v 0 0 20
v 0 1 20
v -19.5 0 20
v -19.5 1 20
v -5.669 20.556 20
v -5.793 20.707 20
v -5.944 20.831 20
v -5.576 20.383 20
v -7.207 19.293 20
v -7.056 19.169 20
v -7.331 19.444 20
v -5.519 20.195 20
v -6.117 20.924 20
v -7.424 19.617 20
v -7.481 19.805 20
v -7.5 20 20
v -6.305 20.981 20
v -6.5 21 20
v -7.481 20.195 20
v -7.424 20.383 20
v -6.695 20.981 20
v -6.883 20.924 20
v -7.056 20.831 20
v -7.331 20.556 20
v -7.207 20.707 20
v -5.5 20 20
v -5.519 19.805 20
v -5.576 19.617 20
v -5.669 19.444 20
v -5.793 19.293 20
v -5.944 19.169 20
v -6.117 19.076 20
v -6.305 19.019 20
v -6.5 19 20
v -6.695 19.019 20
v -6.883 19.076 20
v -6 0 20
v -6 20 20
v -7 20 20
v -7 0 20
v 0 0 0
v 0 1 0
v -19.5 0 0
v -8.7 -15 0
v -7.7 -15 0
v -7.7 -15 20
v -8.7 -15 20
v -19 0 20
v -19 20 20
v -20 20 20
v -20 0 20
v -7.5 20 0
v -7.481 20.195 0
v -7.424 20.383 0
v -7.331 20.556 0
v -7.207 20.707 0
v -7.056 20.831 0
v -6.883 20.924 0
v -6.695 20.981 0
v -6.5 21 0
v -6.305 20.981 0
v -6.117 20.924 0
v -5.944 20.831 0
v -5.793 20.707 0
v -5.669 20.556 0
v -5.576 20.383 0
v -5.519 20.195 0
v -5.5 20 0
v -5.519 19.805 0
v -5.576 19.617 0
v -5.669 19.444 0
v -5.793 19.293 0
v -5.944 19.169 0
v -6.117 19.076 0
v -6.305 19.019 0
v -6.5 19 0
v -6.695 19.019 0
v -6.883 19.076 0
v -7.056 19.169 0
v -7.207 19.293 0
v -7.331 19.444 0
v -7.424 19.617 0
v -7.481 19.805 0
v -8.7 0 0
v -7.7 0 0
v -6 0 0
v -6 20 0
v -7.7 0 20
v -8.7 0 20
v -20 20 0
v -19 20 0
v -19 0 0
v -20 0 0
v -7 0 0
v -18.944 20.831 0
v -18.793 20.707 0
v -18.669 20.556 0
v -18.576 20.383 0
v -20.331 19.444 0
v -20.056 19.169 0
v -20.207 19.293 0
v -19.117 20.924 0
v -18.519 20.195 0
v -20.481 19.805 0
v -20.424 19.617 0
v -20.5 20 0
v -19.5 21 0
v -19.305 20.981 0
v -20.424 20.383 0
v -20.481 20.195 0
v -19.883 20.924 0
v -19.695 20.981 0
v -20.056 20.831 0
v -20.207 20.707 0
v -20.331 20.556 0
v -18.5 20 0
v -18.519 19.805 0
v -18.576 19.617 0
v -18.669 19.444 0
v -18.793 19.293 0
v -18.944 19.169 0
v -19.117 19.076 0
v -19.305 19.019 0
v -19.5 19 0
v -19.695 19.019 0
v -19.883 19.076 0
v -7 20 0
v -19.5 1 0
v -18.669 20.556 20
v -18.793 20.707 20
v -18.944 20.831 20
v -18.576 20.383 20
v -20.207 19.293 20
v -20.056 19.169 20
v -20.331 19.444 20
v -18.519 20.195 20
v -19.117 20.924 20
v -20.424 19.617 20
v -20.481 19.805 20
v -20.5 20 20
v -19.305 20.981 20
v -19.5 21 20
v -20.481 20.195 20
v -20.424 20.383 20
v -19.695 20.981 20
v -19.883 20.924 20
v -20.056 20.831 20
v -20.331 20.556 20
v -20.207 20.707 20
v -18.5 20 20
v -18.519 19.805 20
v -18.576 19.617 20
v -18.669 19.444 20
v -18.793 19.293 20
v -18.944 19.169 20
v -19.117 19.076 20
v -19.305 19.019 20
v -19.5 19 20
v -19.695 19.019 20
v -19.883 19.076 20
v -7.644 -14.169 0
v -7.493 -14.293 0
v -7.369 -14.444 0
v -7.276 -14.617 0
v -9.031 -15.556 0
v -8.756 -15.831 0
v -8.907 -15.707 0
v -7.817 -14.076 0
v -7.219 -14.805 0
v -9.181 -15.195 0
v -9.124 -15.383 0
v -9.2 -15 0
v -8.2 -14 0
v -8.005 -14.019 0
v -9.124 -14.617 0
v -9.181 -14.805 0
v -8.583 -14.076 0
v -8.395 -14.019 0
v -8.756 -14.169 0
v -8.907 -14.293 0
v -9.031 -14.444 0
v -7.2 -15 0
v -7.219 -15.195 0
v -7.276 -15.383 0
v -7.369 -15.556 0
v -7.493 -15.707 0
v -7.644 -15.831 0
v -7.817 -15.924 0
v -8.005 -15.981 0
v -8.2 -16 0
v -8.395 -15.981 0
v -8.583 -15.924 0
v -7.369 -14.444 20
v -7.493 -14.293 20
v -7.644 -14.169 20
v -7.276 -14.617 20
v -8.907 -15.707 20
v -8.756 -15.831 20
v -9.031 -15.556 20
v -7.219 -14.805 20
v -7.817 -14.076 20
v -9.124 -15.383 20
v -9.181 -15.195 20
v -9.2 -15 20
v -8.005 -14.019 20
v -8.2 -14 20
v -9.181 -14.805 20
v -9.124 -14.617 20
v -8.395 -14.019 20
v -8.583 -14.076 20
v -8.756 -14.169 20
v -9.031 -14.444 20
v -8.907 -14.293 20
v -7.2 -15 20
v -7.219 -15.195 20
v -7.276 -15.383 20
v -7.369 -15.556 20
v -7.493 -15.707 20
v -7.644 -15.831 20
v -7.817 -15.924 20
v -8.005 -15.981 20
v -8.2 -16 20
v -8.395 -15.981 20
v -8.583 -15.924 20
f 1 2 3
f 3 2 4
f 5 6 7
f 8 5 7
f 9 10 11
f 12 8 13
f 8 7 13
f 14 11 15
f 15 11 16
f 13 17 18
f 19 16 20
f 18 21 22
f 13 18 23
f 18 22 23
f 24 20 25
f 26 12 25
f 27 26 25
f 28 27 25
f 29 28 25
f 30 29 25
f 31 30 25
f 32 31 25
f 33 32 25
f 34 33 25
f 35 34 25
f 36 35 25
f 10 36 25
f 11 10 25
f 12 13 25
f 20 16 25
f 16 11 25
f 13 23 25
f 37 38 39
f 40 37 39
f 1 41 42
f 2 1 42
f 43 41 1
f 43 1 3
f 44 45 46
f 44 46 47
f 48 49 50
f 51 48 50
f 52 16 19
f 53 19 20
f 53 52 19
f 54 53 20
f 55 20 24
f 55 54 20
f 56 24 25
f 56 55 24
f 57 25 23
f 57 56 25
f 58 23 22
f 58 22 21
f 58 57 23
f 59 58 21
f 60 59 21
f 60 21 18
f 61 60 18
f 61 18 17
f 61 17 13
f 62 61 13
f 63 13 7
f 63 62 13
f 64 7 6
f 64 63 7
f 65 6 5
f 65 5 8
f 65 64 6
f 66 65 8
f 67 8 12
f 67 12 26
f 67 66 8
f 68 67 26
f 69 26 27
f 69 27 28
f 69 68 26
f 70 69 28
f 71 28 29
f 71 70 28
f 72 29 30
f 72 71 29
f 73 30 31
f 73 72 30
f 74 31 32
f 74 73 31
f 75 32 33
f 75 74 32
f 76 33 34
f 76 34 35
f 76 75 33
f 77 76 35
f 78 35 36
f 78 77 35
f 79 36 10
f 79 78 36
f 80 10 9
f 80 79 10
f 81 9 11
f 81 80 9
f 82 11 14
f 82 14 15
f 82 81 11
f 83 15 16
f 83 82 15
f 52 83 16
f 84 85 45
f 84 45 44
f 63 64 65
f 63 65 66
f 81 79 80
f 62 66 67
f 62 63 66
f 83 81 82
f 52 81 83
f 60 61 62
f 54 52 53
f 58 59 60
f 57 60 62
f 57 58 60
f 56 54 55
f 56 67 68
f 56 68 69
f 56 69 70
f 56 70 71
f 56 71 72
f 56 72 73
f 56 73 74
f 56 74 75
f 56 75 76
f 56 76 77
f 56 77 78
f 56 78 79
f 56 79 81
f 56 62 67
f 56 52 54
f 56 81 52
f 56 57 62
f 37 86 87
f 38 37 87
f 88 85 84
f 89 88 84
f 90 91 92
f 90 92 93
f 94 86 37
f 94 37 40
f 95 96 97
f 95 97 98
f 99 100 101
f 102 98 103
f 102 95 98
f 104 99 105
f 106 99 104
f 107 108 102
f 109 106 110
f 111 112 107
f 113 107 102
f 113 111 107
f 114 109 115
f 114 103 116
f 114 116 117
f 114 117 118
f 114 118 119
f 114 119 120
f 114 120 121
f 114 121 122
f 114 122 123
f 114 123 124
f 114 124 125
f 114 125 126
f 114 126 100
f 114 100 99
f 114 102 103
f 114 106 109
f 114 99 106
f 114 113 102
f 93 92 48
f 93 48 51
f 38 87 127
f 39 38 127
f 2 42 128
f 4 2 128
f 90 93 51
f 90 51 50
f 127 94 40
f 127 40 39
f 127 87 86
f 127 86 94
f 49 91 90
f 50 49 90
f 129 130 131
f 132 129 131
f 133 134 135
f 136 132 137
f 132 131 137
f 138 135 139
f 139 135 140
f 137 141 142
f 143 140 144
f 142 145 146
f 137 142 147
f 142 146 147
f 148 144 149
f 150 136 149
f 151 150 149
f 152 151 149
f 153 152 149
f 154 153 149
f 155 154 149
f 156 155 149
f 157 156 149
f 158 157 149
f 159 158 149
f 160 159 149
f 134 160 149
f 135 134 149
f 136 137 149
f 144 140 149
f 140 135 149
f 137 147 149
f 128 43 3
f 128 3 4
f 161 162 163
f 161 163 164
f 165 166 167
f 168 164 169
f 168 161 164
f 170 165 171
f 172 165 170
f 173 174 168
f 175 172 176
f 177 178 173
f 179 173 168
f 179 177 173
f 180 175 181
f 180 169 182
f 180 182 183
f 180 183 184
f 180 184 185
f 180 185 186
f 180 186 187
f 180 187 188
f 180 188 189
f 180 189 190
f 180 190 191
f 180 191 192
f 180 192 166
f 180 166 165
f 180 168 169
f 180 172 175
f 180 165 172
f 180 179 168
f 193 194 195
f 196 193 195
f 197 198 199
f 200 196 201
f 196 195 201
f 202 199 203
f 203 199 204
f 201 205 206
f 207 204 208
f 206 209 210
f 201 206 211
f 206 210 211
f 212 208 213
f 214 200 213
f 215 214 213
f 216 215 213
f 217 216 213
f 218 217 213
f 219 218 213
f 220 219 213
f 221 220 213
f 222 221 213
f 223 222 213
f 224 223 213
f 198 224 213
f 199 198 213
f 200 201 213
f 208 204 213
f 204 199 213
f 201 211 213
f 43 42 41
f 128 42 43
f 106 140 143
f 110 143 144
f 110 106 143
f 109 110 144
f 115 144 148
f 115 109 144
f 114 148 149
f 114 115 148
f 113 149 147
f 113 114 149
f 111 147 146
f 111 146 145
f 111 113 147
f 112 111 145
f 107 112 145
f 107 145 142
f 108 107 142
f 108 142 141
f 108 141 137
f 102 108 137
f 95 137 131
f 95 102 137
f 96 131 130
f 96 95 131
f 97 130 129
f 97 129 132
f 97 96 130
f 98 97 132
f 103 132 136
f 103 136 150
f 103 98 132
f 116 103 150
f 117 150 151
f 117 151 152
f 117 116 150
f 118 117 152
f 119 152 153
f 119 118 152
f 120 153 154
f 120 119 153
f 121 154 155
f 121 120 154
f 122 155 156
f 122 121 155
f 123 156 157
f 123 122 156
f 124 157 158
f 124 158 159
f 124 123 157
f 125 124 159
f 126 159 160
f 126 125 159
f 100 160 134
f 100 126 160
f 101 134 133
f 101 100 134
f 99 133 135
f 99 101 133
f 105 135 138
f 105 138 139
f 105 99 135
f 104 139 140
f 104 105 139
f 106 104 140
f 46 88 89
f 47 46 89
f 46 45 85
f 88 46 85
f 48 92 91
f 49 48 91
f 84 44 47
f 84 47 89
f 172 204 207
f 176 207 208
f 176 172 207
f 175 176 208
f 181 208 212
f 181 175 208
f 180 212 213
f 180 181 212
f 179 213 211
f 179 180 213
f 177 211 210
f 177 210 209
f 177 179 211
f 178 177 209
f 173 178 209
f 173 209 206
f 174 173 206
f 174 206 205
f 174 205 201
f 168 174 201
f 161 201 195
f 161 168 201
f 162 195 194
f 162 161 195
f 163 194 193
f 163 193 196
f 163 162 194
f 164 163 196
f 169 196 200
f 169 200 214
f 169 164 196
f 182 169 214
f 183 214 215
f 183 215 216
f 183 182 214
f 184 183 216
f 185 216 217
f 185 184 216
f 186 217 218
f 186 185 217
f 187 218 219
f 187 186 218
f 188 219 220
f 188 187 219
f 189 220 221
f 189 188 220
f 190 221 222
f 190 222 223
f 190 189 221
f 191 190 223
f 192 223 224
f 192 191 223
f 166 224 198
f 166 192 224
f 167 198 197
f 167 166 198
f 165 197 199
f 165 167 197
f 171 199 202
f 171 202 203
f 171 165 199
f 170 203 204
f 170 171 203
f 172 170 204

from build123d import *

# Parameters (mm, degrees)
BOX_W             = 19.5
BOX_H             = 1
BOX_DEPTH         = 20
BOX001_W          = 1
BOX001_H          = 20
BOX001_DEPTH      = 20
BOX002_W          = 1
BOX002_H          = 20
BOX002_DEPTH      = 20
CYLINDER_R        = 1
CYLINDER_DEPTH    = 20
CYLINDER001_R     = 1
CYLINDER001_DEPTH = 20
BOX003_W          = 1
BOX003_H          = 15
BOX003_DEPTH      = 20
CYLINDER002_R     = 1
CYLINDER002_DEPTH = 20


with BuildPart() as cube:
    # Box → Box (new body)
    with BuildSketch(Plane.XY):
        with Locations((9.75, 0.5)):
            Rectangle(BOX_W, BOX_H)
    extrude(amount=BOX_DEPTH)


with BuildPart() as part_mirroring:
    # Part__Mirroring: instance of Cube
    add(cube.part.mirror(Plane(origin=(0, 0, 0), x_dir=(0, -1, 0), z_dir=(1, 0, 0))))


with BuildPart() as cube001:
    # Box001 → Box001 (new body)
    with BuildSketch(Plane(origin=(6, 0, 0), x_dir=(1, 0, 0), z_dir=(0, 0, 1))):
        with Locations((0.5, 10)):
            Rectangle(BOX001_W, BOX001_H)
    extrude(amount=BOX001_DEPTH)


with BuildPart() as part_mirroring001:
    # Part__Mirroring001: instance of Cube001
    add(cube001.part.mirror(Plane(origin=(0, 0, 0), x_dir=(0, -1, 0), z_dir=(1, 0, 0))))


with BuildPart() as cube002:
    # Box002 → Box002 (new body)
    with BuildSketch(Plane(origin=(19, 0, 0), x_dir=(1, 0, 0), z_dir=(0, 0, 1))):
        with Locations((0.5, 10)):
            Rectangle(BOX002_W, BOX002_H)
    extrude(amount=BOX002_DEPTH)


with BuildPart() as part_mirroring002:
    # Part__Mirroring002: instance of Cube002
    add(cube002.part.mirror(Plane(origin=(0, 0, 0), x_dir=(0, -1, 0), z_dir=(1, 0, 0))))


with BuildPart() as cylinder:
    # Cylinder → Cylinder (new body)
    with BuildSketch(Plane(origin=(6.5, 20, 0), x_dir=(1, 0, 0), z_dir=(0, 0, 1))):
        Circle(CYLINDER_R)
    extrude(amount=CYLINDER_DEPTH)


with BuildPart() as part_mirroring003:
    # Part__Mirroring003: instance of Cylinder
    add(cylinder.part.mirror(Plane(origin=(0, 0, 0), x_dir=(0, -1, 0), z_dir=(1, 0, 0))))


with BuildPart() as cylinder001:
    # Cylinder001 → Cylinder001 (new body)
    with BuildSketch(Plane(origin=(19.5, 20, 0), x_dir=(1, 0, 0), z_dir=(0, 0, 1))):
        Circle(CYLINDER001_R)
    extrude(amount=CYLINDER001_DEPTH)


with BuildPart() as part_mirroring004:
    # Part__Mirroring004: instance of Cylinder001
    add(cylinder001.part.mirror(Plane(origin=(0, 0, 0), x_dir=(0, -1, 0), z_dir=(1, 0, 0))))


with BuildPart() as cube003:
    # Box003 → Box003 (new body)
    with BuildSketch(Plane(origin=(7.7, -15, 0), x_dir=(1, 0, 0), z_dir=(0, 0, 1))):
        with Locations((0.5, 7.5)):
            Rectangle(BOX003_W, BOX003_H)
    extrude(amount=BOX003_DEPTH)


with BuildPart() as part_mirroring005:
    # Part__Mirroring005: instance of Cube003
    add(cube003.part.mirror(Plane(origin=(0, 0, 0), x_dir=(0, -1, 0), z_dir=(1, 0, 0))))


with BuildPart() as cylinder002:
    # Cylinder002 → Cylinder002 (new body)
    with BuildSketch(Plane(origin=(8.2, -15, 0), x_dir=(1, 0, 0), z_dir=(0, 0, 1))):
        Circle(CYLINDER002_R)
    extrude(amount=CYLINDER002_DEPTH)


with BuildPart() as part_mirroring006:
    # Part__Mirroring006: instance of Cylinder002
    add(cylinder002.part.mirror(Plane(origin=(0, 0, 0), x_dir=(0, -1, 0), z_dir=(1, 0, 0))))


solid = Compound([part_mirroring.part, part_mirroring001.part, part_mirroring002.part, part_mirroring003.part, part_mirroring004.part, part_mirroring005.part, part_mirroring006.part])
